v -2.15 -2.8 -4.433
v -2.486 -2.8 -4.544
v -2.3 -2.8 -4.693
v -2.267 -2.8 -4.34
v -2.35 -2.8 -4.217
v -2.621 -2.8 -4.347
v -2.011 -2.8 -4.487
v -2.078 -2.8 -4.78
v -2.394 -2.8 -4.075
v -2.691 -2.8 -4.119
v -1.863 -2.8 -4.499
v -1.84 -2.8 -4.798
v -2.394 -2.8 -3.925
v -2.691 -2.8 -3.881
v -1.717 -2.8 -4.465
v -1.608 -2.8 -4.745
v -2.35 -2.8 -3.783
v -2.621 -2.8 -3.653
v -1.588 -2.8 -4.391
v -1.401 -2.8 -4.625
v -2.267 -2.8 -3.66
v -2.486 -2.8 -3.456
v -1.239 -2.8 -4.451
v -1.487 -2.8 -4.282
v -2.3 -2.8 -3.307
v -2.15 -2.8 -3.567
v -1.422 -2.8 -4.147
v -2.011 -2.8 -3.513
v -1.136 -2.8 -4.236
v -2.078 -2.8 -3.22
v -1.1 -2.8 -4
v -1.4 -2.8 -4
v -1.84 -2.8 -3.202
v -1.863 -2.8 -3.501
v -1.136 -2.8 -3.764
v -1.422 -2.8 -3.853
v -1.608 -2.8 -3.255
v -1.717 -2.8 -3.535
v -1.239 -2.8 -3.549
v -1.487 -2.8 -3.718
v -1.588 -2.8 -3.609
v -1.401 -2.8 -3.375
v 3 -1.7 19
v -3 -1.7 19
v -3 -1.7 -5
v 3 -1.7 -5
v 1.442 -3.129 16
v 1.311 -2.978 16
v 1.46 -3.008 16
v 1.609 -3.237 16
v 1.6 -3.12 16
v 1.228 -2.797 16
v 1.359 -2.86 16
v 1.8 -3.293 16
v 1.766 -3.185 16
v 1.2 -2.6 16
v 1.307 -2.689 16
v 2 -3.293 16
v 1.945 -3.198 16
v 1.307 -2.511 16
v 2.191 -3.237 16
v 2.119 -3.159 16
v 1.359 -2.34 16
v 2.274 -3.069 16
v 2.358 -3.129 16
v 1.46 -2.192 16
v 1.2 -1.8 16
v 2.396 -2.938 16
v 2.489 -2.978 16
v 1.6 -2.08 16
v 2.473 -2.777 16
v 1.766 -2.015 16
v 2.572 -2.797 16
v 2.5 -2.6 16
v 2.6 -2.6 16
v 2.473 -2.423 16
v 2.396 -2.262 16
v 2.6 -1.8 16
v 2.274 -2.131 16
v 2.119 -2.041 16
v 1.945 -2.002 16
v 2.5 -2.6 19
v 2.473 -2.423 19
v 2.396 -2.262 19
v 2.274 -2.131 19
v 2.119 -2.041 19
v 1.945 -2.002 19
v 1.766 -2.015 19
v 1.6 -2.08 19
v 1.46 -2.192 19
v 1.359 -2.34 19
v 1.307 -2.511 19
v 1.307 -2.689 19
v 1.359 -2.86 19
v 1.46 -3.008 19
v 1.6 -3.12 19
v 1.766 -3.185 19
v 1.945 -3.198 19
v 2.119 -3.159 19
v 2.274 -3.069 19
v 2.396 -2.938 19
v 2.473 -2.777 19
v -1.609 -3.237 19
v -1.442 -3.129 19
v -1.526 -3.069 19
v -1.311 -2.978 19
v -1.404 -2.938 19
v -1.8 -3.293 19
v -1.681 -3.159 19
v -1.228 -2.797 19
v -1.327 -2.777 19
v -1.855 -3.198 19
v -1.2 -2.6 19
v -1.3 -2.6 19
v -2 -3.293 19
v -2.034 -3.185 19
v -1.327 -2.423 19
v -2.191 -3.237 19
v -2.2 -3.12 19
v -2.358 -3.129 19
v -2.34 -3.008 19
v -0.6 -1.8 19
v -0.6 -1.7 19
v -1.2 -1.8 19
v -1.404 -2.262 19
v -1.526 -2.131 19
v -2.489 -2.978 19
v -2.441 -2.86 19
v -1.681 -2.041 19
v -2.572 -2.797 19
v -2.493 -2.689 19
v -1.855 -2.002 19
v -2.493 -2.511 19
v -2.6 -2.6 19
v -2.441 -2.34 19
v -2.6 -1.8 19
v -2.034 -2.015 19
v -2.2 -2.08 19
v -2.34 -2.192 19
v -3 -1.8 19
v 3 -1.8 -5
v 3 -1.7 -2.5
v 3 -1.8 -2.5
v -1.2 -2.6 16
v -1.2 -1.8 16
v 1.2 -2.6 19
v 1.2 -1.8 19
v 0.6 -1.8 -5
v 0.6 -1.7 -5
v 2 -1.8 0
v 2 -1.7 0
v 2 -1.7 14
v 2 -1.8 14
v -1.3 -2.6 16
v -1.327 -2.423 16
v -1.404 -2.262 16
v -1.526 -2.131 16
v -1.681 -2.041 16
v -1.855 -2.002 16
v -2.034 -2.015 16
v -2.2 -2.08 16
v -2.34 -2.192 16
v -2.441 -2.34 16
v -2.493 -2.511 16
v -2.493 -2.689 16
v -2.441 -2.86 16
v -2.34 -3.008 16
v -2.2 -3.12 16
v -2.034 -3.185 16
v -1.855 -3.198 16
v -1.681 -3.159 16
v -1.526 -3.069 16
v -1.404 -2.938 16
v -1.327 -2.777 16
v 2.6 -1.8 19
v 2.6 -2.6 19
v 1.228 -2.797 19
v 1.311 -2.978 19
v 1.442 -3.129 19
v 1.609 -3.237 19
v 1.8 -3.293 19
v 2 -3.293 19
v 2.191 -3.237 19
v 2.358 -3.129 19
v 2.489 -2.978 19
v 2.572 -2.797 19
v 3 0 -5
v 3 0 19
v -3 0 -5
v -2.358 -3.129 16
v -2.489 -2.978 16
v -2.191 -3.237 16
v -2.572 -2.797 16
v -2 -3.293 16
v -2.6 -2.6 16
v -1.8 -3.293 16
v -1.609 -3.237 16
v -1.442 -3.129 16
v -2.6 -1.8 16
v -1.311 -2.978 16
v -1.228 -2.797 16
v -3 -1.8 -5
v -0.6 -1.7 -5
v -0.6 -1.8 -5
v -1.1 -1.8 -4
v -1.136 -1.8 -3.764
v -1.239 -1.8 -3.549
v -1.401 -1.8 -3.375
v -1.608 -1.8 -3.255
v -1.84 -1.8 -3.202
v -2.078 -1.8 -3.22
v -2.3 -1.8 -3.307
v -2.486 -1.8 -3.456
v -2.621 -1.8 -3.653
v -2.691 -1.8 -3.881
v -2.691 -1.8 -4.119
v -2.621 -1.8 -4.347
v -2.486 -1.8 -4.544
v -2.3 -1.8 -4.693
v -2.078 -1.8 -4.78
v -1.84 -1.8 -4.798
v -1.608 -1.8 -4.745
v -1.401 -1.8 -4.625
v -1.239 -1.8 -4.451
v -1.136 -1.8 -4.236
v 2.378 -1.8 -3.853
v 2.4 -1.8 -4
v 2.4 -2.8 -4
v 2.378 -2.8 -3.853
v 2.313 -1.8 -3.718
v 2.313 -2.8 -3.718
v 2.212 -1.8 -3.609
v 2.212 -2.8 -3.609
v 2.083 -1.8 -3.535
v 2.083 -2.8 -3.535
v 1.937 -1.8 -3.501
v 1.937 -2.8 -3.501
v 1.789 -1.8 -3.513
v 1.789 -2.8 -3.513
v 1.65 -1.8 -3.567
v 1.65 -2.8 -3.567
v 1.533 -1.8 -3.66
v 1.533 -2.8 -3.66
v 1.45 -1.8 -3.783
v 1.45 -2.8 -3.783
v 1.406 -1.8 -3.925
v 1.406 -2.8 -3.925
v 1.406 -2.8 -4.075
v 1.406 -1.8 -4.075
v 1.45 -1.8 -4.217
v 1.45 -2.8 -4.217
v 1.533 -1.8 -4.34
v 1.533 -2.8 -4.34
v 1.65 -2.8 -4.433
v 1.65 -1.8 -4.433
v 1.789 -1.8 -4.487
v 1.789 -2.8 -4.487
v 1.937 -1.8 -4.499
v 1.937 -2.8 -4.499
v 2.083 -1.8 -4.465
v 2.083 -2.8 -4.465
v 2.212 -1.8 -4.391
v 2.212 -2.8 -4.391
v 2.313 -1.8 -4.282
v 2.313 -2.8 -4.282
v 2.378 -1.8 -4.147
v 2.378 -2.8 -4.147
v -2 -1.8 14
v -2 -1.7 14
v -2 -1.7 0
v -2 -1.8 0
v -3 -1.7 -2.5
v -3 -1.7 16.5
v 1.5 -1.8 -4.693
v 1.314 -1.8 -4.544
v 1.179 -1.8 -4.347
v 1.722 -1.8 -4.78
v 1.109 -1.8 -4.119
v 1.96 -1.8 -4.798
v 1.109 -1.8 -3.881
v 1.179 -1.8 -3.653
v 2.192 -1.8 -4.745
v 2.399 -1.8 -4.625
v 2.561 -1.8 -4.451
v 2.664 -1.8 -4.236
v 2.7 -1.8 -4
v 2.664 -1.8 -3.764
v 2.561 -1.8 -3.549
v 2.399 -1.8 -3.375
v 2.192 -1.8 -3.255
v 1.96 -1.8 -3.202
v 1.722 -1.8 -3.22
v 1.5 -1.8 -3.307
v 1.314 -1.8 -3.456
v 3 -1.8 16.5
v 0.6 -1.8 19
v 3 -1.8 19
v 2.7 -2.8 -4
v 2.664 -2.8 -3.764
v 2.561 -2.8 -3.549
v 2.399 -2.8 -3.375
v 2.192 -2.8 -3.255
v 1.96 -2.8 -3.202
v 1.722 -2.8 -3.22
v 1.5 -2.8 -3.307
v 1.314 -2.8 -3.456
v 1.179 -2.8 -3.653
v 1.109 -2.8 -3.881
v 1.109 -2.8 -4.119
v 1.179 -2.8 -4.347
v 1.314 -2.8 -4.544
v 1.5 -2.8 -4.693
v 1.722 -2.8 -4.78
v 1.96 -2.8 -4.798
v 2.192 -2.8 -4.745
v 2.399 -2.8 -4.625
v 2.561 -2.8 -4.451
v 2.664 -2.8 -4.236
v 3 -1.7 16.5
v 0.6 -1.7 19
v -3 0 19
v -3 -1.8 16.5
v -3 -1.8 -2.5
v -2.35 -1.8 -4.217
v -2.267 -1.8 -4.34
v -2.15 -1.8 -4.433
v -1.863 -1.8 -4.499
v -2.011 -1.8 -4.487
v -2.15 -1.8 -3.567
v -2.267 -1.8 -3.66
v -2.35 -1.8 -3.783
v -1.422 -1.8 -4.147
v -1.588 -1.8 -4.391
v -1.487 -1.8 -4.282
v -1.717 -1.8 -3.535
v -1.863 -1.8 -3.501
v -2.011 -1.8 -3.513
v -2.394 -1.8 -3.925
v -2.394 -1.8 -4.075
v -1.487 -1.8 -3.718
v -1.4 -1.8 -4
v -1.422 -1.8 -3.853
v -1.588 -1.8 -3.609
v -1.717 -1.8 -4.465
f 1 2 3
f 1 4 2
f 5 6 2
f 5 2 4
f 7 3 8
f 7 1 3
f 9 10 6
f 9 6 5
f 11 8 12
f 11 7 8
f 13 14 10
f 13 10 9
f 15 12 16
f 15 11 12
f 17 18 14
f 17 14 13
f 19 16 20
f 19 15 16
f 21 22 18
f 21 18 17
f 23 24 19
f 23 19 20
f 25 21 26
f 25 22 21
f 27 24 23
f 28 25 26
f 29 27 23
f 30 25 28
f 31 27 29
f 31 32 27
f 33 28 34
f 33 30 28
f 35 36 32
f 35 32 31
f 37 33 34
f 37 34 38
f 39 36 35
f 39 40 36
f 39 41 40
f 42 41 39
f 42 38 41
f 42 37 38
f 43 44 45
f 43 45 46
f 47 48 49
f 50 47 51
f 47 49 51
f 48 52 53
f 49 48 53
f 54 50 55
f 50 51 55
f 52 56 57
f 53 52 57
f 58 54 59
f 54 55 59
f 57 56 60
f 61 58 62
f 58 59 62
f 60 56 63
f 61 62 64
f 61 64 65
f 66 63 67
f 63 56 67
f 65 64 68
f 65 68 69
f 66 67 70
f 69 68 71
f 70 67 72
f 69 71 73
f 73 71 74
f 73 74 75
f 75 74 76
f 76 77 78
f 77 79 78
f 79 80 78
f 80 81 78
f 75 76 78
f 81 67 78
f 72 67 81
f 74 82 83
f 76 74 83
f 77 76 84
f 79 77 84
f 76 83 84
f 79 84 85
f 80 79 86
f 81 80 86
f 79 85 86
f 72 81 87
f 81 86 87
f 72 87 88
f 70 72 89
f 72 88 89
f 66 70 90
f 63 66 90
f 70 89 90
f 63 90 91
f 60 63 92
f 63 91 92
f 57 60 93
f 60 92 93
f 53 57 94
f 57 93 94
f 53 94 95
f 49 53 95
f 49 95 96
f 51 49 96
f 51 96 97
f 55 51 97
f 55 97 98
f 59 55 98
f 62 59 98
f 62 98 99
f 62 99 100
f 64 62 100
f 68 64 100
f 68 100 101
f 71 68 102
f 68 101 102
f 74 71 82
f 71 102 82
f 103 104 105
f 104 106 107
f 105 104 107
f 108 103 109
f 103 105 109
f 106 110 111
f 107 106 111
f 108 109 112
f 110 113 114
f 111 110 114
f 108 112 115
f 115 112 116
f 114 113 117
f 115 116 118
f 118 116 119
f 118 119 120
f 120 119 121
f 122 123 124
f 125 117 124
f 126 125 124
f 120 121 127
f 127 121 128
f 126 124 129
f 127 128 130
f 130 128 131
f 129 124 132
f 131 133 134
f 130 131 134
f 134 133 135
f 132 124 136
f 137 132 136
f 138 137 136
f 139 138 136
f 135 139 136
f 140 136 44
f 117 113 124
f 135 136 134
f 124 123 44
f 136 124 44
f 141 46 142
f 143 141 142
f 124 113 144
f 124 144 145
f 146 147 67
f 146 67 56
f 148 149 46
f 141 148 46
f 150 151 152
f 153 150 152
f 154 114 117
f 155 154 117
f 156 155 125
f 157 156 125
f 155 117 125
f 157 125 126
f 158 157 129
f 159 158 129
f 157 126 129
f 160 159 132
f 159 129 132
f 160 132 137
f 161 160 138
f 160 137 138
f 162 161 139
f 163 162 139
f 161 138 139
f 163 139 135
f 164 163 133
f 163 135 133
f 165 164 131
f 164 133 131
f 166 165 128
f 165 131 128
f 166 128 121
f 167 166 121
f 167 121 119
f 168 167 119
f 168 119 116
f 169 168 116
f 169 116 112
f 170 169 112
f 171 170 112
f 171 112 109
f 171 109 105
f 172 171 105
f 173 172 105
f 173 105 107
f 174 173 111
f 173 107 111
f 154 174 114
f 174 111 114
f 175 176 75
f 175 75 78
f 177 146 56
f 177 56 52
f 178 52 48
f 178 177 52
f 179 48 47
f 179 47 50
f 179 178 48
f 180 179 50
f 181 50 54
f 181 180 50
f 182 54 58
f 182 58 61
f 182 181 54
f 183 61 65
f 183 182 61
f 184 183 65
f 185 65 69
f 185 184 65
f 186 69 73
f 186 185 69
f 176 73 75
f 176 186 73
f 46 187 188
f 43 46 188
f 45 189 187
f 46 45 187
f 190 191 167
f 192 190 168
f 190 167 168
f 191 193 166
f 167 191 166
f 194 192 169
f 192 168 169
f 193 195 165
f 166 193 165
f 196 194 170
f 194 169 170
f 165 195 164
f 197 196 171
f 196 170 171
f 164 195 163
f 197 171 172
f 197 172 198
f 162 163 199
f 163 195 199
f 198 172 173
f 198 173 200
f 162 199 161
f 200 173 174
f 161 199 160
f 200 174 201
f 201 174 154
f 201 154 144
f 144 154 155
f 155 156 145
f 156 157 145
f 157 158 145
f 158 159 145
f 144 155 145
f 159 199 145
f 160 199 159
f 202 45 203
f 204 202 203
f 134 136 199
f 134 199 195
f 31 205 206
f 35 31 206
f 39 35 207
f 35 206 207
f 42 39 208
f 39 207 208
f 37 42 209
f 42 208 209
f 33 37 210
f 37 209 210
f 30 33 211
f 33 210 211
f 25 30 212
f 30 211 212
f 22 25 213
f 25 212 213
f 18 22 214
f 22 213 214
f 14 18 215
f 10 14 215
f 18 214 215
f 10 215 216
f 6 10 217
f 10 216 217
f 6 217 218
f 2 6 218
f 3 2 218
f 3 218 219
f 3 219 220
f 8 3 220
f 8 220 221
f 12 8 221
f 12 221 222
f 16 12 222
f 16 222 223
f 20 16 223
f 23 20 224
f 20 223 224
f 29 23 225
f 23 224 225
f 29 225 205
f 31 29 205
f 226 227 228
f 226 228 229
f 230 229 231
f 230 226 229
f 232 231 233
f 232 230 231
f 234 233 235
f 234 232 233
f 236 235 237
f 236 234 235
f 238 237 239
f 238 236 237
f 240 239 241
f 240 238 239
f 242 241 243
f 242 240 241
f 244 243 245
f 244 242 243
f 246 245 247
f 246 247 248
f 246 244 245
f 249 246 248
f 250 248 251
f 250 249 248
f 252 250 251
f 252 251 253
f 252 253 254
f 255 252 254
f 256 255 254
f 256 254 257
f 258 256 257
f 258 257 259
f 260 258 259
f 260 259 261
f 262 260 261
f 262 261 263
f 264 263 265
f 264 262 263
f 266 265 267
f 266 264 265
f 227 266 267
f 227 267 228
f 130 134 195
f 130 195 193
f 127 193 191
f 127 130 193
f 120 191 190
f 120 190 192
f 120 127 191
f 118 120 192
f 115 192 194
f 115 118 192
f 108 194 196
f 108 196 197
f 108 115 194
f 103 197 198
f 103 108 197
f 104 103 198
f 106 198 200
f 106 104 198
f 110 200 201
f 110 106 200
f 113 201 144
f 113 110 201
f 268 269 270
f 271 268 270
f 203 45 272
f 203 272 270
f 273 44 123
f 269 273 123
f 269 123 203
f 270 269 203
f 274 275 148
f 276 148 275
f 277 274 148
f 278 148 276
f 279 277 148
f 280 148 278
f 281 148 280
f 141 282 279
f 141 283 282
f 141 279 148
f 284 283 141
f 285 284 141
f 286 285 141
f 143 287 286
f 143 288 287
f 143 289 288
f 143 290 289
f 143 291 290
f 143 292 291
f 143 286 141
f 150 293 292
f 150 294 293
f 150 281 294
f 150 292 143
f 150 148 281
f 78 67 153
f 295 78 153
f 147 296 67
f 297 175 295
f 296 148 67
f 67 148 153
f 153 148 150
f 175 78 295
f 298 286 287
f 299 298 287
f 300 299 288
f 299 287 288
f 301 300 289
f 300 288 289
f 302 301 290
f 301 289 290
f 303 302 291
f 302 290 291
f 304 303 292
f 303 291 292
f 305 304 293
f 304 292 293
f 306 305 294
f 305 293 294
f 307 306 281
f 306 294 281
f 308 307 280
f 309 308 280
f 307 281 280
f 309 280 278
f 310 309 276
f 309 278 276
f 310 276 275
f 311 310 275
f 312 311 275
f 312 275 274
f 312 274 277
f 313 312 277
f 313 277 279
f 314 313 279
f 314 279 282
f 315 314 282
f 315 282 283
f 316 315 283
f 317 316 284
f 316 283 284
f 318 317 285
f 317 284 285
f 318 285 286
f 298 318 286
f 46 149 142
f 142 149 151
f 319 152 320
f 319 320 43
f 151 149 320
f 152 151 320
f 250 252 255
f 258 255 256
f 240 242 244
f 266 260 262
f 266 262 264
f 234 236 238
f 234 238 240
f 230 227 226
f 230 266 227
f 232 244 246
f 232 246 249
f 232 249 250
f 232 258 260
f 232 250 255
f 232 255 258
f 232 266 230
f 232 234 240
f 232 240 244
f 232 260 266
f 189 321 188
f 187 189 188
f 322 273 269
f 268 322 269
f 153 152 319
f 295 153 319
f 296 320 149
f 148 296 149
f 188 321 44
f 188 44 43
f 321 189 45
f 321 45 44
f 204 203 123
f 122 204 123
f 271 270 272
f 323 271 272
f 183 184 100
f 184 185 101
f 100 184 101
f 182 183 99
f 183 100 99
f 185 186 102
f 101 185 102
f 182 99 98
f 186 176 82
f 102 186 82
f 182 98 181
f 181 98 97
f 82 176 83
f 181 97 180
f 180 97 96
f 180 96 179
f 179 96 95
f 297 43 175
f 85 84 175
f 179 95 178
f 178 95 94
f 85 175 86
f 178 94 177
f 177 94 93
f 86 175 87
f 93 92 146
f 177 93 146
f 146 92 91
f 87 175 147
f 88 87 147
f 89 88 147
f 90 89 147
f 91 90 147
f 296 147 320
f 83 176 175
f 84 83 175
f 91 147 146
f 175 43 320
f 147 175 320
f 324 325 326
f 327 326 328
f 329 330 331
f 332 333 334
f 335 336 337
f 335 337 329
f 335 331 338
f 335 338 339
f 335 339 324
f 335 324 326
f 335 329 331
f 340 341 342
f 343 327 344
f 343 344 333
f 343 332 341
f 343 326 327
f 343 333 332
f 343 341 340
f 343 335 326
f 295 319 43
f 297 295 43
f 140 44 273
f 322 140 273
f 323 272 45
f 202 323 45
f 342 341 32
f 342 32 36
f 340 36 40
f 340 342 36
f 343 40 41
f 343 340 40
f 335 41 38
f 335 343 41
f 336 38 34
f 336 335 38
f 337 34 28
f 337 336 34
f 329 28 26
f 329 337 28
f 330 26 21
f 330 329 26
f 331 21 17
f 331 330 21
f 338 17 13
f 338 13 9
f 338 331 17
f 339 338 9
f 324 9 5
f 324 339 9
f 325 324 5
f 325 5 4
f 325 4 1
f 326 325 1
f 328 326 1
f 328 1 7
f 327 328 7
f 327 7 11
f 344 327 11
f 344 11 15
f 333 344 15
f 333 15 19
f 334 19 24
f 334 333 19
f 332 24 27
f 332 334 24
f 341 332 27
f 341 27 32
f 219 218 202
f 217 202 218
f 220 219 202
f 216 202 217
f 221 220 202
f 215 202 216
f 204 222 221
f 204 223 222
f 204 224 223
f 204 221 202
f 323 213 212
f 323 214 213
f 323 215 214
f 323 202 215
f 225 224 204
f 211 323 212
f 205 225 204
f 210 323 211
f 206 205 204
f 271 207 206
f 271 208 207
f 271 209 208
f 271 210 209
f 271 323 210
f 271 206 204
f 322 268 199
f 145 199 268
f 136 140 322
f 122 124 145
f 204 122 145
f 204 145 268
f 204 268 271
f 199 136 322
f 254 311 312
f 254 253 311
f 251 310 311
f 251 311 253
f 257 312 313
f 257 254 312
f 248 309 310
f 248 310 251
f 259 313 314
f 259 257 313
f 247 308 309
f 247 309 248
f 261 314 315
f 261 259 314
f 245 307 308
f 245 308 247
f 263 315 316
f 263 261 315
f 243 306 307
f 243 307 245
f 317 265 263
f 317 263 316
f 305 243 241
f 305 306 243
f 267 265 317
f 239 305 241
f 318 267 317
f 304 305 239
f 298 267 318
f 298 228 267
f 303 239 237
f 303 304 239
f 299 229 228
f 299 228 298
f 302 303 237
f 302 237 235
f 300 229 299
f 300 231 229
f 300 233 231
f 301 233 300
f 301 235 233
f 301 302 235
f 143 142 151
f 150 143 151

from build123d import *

# Parameters (mm, degrees)
F0_W     = 6
F0_H     = 24
F1_DEPTH = 1.7
F3_DEPTH = 0.1
F4_R     = 0.8
F4_R_2   = 0.5
F5_DEPTH = 1
F6_R     = 0.8
F6_R_2   = 0.5
F7_DEPTH = 1
F8_R     = 0.6
F9_DEPTH = 3


with BuildPart() as f1:
    # F0 (on Front) → F1 (new body)
    with BuildSketch(Plane.XZ):
        with Locations((0, 7)):
            Rectangle(F0_W, F0_H)
    extrude(amount=F1_DEPTH)


with BuildPart() as f3:
    # F2 (on face) → F3 (new body)
    with BuildSketch(Plane.XZ.offset(1.7)):
        Polygon((-3, -2.5), (-3, -5), (-0.6, -5), (-0.6, 7), (-0.6, 19), (-3, 19), (-3, 16.5), (-2, 14), (-2, 7), (-2, 0), align=None)
        Polygon((0.6, 7), (0.6, -5), (3, -5), (3, -2.5), (2, 0), (2, 7), (2, 14), (3, 16.5), (3, 19), (0.6, 19), align=None)
    extrude(amount=F3_DEPTH)

    # F4 (on face) → F5 (join)
    with BuildSketch(Plane.XZ.offset(1.8)):
        with Locations((-1.9, -4)):
            Circle(F4_R)
        with Locations((-1.9, -4)):
            Circle(F4_R_2, mode=Mode.SUBTRACT)
    extrude(amount=F5_DEPTH)

    # F6 (on face) → F7 (join)
    with BuildSketch(Plane.XZ.offset(1.8)):
        with Locations((1.9, -4)):
            Circle(F6_R)
        with Locations((1.9, -4)):
            Circle(F6_R_2, mode=Mode.SUBTRACT)
    extrude(amount=F7_DEPTH)

    # F8 (on face) → F9 (join)
    with BuildSketch(Plane.XY.offset(19)):
        with BuildLine():
            Line((-2.6, -1.8), (-2.6, -2.6))
            ThreePointArc((-2.6, -2.6), (-1.9, -3.3), (-1.2, -2.6))
            Line((-1.2, -2.6), (-1.2, -1.8))
            Line((-1.2, -1.8), (-2.6, -1.8))
        make_face()
        with Locations((-1.9, -2.6)):
            Circle(F8_R, mode=Mode.SUBTRACT)
        with BuildLine():
            Line((1.2, -1.8), (1.2, -2.6))
            ThreePointArc((1.2, -2.6), (1.9, -3.3), (2.6, -2.6))
            Line((2.6, -2.6), (2.6, -1.8))
            Line((2.6, -1.8), (1.2, -1.8))
        make_face()
        with Locations((1.9, -2.6)):
            Circle(F8_R, mode=Mode.SUBTRACT)
    extrude(amount=-F9_DEPTH)


solid = Compound([f1.part, f3.part])
